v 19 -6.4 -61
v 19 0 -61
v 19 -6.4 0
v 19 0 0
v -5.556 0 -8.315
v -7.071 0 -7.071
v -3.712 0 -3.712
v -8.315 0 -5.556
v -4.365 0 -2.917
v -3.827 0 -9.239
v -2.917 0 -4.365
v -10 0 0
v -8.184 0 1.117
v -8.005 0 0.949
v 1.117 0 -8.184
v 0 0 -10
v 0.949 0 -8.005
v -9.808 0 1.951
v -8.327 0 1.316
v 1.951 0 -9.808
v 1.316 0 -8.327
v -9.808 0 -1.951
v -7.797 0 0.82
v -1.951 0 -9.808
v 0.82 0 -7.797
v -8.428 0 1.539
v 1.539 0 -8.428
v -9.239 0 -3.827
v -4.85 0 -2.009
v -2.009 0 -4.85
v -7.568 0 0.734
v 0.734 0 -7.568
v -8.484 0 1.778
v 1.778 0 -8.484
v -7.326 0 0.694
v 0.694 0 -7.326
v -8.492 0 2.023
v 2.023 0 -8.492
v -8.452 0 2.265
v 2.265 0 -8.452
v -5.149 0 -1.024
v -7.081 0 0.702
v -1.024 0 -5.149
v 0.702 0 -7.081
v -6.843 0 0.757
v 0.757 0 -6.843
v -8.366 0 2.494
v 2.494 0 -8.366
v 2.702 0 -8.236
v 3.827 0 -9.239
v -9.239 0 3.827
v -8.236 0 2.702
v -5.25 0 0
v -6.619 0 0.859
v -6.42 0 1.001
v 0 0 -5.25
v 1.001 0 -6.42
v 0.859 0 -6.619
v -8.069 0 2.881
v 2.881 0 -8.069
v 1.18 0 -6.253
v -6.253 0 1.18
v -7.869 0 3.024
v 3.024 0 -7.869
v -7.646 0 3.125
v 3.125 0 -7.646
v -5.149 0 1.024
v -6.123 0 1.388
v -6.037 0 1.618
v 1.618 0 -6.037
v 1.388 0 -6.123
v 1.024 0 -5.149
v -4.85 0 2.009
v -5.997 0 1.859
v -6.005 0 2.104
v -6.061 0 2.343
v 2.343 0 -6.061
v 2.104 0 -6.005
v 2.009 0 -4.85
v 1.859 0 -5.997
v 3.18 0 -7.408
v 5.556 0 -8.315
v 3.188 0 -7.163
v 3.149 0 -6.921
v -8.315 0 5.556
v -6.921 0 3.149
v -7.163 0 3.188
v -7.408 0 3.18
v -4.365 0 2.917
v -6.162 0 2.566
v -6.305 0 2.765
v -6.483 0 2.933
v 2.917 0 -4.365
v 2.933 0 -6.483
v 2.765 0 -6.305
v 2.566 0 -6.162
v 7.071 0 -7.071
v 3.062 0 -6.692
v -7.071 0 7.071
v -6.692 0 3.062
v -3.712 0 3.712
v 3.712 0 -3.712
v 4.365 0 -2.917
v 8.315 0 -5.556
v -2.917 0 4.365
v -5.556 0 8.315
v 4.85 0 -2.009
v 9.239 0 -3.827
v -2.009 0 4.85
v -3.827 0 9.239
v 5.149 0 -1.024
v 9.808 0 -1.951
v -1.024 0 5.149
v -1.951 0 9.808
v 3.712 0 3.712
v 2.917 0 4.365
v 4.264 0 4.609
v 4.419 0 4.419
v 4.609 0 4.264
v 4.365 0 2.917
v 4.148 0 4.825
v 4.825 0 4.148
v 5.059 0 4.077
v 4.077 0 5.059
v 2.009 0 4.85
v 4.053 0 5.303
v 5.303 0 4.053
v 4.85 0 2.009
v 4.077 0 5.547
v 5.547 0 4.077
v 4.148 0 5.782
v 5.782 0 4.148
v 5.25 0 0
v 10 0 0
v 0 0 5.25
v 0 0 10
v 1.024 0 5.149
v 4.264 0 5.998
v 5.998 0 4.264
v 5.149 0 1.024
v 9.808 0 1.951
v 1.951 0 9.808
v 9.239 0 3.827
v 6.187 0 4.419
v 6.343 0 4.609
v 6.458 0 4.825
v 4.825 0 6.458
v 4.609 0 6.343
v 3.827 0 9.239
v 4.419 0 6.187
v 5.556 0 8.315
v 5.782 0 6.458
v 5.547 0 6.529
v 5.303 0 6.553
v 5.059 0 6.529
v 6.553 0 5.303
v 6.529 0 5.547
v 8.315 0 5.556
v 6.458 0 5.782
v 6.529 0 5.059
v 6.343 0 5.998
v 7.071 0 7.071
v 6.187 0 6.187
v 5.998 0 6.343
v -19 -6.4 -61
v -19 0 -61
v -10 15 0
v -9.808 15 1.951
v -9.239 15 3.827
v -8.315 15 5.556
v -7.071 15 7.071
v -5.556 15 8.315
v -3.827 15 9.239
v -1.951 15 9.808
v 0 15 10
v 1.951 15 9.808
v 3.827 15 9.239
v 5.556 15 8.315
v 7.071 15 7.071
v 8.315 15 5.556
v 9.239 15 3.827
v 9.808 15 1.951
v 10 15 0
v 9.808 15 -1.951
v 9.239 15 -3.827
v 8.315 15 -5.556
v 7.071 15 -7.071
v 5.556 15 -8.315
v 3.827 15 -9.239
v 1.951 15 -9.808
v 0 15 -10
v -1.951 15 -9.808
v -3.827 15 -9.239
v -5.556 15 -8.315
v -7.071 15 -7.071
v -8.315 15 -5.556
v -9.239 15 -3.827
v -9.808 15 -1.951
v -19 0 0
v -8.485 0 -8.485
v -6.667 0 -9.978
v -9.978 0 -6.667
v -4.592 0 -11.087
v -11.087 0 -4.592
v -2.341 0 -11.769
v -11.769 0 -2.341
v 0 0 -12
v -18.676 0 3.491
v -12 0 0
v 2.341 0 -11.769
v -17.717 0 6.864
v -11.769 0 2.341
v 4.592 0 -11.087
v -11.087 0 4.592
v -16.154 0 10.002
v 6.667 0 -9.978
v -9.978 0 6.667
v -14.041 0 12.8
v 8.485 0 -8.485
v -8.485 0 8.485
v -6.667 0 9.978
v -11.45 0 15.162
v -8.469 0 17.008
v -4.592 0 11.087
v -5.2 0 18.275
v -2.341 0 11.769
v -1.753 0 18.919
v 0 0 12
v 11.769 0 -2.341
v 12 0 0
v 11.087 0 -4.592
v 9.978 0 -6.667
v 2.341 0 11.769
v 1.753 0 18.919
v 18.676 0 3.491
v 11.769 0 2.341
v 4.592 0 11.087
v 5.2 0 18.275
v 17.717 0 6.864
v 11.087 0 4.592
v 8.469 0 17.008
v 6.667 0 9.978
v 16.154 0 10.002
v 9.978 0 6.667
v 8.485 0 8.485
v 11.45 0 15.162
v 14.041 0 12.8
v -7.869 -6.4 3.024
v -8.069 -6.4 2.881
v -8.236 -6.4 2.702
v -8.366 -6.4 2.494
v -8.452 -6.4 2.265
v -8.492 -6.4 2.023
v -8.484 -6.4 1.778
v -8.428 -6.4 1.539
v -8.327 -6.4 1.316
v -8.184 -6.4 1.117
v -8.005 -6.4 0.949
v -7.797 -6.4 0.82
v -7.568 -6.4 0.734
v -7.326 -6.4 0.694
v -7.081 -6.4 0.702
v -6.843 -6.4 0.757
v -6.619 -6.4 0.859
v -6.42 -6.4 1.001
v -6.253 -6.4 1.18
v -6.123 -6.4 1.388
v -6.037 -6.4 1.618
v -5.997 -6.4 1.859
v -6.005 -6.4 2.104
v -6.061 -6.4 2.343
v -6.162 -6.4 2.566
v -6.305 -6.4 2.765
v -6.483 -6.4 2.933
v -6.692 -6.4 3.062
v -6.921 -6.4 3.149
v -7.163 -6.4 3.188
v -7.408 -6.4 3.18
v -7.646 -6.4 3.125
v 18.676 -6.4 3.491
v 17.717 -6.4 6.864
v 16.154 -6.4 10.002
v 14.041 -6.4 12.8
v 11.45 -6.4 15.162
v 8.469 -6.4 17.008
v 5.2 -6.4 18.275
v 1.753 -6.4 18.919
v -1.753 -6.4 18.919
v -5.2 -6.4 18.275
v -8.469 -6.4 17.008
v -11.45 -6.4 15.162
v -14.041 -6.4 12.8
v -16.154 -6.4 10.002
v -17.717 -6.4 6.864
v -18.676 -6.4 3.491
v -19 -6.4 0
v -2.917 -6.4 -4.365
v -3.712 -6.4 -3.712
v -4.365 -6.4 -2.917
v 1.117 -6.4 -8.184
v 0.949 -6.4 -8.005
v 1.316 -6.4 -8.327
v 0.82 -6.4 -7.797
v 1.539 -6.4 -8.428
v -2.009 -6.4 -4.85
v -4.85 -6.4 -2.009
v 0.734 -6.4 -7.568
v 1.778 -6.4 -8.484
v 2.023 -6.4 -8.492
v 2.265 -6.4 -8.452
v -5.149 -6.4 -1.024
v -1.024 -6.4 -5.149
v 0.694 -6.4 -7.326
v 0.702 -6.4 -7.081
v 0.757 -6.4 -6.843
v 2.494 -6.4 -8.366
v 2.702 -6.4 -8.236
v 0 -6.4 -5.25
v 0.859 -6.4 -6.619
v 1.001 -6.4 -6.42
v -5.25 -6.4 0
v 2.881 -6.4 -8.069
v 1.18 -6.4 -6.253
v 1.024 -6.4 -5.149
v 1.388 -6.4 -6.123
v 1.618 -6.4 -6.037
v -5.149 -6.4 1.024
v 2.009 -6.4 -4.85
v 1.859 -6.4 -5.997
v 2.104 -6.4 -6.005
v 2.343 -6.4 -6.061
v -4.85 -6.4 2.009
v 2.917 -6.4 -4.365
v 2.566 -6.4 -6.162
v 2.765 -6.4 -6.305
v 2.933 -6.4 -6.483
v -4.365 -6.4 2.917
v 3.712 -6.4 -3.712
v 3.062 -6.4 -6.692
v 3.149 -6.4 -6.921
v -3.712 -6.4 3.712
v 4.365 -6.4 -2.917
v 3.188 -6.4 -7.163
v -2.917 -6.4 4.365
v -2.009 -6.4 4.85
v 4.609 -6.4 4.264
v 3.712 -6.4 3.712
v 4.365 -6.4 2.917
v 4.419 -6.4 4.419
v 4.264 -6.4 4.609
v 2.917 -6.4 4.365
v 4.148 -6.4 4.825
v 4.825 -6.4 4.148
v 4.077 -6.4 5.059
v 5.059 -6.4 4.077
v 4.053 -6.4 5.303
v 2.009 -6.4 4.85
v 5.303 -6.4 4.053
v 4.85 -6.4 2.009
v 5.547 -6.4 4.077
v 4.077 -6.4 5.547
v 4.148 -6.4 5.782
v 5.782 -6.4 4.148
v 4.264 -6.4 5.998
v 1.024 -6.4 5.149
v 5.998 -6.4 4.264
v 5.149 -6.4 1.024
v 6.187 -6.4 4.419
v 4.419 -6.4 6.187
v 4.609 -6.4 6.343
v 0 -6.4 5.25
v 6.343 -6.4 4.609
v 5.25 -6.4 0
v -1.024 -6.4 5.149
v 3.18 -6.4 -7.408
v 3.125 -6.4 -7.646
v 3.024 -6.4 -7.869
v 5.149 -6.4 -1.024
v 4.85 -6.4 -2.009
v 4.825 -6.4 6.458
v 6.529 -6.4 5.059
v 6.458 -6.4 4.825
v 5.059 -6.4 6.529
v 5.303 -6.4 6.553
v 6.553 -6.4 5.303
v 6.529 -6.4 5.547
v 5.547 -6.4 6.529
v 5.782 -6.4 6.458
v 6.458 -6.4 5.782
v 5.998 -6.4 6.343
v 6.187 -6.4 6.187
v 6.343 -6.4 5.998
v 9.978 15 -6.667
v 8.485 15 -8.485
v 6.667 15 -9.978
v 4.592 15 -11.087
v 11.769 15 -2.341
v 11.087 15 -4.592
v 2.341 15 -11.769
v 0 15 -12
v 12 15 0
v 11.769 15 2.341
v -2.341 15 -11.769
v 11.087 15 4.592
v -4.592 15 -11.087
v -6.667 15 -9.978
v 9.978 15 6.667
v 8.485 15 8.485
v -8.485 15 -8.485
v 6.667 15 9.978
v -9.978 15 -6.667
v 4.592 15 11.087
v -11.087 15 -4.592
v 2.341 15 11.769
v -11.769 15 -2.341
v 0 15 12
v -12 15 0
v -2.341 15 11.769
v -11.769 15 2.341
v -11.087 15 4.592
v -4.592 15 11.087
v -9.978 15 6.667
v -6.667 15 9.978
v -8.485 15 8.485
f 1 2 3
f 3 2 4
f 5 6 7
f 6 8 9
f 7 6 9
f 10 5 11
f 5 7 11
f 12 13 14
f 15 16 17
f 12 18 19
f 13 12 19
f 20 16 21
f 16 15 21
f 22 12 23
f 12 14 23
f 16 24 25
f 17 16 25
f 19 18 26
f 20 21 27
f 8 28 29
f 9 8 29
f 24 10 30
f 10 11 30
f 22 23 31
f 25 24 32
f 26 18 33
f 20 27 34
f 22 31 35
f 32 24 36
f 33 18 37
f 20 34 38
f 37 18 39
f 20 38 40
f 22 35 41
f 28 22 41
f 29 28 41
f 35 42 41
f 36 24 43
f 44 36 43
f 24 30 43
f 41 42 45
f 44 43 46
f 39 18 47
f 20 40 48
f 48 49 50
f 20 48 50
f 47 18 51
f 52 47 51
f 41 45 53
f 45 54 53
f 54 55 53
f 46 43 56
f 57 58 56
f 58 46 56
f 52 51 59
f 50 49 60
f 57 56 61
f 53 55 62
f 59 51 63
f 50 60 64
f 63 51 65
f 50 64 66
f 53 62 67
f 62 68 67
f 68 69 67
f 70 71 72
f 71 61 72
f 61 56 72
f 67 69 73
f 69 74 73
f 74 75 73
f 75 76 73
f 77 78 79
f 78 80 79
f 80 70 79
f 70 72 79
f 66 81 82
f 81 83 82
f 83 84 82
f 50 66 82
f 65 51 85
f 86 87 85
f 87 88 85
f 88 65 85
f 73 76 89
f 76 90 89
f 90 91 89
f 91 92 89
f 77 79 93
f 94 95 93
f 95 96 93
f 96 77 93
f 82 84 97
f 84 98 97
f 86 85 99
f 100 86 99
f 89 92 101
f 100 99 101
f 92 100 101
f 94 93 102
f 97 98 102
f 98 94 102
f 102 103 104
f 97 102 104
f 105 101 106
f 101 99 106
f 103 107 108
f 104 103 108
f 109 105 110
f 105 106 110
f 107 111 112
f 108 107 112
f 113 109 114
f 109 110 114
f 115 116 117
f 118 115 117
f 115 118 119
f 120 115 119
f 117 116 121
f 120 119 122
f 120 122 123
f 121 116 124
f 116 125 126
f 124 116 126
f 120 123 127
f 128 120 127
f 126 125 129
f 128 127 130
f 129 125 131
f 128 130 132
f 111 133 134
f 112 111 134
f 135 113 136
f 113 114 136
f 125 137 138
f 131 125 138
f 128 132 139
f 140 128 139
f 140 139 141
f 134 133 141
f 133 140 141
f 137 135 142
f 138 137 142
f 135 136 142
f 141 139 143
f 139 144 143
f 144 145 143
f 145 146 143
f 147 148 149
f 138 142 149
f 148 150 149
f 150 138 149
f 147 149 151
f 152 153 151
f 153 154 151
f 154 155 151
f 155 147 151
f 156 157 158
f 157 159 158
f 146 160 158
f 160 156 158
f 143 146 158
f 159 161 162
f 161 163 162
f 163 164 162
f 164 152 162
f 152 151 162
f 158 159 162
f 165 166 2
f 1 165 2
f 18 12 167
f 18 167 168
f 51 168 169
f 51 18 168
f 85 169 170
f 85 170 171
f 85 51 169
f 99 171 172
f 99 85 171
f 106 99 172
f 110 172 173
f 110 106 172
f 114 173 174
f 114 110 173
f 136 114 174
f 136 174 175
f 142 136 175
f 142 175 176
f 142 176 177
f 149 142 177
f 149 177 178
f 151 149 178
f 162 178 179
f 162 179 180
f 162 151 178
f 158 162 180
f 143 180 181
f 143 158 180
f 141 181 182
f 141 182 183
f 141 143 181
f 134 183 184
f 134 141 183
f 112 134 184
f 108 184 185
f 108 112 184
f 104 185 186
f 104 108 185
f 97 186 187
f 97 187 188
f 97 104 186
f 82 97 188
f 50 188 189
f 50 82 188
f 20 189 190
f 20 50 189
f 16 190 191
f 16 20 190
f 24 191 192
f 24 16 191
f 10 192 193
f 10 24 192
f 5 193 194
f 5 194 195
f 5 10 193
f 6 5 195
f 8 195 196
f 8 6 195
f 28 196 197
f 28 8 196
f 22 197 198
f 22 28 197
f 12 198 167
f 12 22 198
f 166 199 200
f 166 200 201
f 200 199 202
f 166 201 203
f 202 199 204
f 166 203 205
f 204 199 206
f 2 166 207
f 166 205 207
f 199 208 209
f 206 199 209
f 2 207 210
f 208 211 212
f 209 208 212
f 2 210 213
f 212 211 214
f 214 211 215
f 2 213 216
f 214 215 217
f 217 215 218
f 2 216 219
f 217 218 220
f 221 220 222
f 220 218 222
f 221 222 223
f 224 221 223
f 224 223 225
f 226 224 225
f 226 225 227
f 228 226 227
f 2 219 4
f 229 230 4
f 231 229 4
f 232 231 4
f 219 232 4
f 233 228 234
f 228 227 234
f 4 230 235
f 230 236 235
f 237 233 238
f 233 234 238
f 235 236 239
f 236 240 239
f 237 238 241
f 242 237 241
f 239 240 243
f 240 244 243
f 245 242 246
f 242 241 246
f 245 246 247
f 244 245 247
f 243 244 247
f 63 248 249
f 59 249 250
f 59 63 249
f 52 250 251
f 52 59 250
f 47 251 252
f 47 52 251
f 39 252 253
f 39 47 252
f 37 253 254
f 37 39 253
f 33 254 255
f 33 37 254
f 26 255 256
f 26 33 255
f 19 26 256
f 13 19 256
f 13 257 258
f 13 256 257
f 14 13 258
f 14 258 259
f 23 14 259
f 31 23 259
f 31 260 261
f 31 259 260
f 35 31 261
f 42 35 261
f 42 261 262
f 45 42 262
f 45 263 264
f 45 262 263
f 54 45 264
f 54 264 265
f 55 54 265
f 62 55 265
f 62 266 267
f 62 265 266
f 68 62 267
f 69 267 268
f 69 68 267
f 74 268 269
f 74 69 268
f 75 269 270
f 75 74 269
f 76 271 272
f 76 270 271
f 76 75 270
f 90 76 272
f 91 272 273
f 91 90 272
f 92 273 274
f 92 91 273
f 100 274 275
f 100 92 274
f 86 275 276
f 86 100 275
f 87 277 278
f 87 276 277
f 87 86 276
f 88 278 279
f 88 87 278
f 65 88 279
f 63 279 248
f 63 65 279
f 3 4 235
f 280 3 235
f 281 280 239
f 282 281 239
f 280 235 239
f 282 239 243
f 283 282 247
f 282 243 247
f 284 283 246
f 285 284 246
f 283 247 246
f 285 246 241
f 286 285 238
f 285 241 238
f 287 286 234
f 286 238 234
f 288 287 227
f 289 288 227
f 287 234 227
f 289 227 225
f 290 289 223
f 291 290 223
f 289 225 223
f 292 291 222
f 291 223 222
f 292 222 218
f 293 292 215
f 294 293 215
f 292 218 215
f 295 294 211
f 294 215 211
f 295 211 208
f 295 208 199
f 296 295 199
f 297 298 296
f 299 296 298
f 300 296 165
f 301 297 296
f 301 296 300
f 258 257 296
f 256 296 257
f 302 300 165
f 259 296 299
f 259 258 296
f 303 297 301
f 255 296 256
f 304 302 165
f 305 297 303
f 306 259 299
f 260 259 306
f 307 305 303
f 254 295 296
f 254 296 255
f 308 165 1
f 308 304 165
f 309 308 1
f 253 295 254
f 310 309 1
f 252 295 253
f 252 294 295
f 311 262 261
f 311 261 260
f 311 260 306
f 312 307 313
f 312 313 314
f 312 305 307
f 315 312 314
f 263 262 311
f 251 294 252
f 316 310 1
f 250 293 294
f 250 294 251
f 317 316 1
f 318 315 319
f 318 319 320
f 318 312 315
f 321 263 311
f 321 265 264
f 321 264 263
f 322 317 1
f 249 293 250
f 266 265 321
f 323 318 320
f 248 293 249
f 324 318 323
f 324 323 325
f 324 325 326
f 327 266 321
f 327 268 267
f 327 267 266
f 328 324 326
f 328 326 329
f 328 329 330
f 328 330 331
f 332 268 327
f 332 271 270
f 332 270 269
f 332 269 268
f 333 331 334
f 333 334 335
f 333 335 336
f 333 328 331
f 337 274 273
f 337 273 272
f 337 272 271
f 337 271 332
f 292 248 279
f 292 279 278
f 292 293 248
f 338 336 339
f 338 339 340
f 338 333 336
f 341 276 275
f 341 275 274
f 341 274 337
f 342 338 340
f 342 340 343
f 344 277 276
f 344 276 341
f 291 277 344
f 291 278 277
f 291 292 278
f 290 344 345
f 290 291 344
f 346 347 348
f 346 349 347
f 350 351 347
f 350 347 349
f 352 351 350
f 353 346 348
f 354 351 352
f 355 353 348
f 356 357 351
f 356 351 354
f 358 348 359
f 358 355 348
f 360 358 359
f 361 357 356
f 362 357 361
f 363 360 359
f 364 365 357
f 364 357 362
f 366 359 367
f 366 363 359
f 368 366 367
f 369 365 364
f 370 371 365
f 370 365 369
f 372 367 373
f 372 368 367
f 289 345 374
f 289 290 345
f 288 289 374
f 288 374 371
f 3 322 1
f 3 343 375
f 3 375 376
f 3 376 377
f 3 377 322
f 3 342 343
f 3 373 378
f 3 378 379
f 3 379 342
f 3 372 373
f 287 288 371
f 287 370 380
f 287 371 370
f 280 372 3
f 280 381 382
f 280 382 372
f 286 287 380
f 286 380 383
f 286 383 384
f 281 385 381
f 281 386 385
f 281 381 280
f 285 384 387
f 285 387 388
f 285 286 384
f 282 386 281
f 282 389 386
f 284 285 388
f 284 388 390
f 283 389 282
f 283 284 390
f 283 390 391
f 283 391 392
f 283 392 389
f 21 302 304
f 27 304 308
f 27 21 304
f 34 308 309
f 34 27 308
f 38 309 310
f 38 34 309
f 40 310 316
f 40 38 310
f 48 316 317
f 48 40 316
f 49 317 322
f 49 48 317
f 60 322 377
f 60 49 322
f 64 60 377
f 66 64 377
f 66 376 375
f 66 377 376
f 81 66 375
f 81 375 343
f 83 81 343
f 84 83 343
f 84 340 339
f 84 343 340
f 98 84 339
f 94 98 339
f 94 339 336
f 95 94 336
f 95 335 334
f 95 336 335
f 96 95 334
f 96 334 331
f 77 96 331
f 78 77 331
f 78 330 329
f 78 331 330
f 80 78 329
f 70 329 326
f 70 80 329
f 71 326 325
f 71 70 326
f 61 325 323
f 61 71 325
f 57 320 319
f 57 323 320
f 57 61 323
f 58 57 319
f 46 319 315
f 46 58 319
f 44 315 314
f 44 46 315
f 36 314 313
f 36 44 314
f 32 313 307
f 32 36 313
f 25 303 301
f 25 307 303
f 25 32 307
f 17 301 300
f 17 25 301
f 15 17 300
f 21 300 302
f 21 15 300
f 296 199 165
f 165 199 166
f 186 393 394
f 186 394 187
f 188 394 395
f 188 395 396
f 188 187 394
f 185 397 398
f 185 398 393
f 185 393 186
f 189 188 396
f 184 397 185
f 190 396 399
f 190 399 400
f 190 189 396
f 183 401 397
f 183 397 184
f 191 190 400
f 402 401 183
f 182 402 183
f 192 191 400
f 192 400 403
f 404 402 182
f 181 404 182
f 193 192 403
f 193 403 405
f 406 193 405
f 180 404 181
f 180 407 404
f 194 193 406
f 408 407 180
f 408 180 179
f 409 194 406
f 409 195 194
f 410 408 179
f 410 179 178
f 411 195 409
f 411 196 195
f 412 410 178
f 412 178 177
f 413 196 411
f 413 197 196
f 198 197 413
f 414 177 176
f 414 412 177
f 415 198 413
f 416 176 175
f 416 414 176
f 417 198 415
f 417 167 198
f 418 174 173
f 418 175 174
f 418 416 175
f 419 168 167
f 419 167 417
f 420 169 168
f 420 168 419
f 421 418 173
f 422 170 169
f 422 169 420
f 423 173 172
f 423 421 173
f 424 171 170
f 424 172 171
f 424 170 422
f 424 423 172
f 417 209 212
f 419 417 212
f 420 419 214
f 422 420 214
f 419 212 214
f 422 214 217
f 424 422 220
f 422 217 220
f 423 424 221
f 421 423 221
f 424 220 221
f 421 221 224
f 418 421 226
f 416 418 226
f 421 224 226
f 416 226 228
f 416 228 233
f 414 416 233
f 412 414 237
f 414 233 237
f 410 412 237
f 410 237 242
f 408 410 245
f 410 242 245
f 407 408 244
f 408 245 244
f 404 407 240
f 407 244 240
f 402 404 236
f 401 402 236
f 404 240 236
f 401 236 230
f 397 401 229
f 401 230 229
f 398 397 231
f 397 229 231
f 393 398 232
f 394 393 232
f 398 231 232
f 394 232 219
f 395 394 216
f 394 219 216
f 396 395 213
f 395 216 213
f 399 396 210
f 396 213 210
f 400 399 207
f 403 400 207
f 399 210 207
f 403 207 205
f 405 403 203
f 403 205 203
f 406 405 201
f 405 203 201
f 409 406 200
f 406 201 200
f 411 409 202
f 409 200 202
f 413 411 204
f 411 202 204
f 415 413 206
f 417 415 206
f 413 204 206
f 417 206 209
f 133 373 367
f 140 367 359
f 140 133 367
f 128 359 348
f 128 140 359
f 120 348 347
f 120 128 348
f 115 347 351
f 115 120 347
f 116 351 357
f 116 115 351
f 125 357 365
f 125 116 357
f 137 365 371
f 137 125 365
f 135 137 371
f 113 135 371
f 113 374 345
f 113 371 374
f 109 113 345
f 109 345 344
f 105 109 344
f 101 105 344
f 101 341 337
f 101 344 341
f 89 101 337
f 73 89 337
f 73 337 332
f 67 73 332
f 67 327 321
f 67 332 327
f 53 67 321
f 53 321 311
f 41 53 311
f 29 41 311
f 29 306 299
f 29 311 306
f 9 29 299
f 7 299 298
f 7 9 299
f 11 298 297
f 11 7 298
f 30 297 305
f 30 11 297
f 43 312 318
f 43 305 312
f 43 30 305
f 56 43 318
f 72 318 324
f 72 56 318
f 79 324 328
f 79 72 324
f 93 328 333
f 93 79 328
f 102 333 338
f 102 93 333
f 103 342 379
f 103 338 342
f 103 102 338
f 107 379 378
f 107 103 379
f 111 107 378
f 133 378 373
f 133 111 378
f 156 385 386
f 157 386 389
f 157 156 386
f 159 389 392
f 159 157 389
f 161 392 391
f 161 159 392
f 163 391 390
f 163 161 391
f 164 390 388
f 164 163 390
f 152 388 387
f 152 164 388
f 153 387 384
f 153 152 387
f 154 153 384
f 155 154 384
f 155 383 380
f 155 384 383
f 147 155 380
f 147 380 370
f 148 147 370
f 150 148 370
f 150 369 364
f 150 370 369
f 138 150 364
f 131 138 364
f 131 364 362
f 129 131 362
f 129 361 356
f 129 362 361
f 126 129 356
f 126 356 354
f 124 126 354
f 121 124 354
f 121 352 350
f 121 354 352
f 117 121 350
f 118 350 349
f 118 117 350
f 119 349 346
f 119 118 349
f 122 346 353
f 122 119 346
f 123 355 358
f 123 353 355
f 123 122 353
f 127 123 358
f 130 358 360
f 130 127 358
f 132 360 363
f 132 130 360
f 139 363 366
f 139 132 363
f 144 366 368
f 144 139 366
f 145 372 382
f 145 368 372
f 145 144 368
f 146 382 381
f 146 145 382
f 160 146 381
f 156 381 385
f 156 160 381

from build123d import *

# Parameters (mm, degrees)
F1_DEPTH        = 6.4
F2_R            = 1.25
F3_DEPTH        = 6.401
F3_COPIES_COUNT = 3
F4_R            = 5.25
F5_DEPTH        = 6.401
F6_R            = 12
F6_R_2          = 10
F7_DEPTH        = 15


# Not quite as in the source:
# - a pattern or mirror of a feature is missing from the dataset's text; its kind, count and spacing are read off the source's solid


with BuildPart() as f1:
    # F0 (on Front) → F1 (new body)
    with BuildSketch(Plane.XZ):
        with BuildLine():
            Line((-19, 0), (-19, -61))
            Line((-19, -61), (19, -61))
            Line((19, -61), (19, 0))
            ThreePointArc((19, 0), (0, 19), (-19, 0))
        make_face()
    extrude(amount=F1_DEPTH)

    # F2 (on Front) → F3 (cut, through all)
    with BuildSketch(Plane.XZ):
        with Locations((5.3033008589, 5.3033008589)):
            Circle(F2_R)
    f3 = extrude(amount=F3_DEPTH, mode=Mode.SUBTRACT)

    # F3_copies: F3 ×3 about axis
    f3_copies_axis = Axis((0, 0, 0), (0, 1, 0))
    for i in range(1, F3_COPIES_COUNT):
        add(f3.rotate(f3_copies_axis, i * 360 / F3_COPIES_COUNT), mode=Mode.SUBTRACT)

    # F4 (on Front) → F5 (cut, through all)
    with BuildSketch(Plane.XZ):
        Circle(F4_R)
    extrude(amount=F5_DEPTH, mode=Mode.SUBTRACT)

    # F6 (on face) → F7 (join)
    with BuildSketch(Plane(origin=(0, 0, 0), x_dir=(-1, 0, 0), z_dir=(0, 1, 0))):
        Circle(F6_R)
        Circle(F6_R_2, mode=Mode.SUBTRACT)
    extrude(amount=F7_DEPTH)


solid = f1.part
